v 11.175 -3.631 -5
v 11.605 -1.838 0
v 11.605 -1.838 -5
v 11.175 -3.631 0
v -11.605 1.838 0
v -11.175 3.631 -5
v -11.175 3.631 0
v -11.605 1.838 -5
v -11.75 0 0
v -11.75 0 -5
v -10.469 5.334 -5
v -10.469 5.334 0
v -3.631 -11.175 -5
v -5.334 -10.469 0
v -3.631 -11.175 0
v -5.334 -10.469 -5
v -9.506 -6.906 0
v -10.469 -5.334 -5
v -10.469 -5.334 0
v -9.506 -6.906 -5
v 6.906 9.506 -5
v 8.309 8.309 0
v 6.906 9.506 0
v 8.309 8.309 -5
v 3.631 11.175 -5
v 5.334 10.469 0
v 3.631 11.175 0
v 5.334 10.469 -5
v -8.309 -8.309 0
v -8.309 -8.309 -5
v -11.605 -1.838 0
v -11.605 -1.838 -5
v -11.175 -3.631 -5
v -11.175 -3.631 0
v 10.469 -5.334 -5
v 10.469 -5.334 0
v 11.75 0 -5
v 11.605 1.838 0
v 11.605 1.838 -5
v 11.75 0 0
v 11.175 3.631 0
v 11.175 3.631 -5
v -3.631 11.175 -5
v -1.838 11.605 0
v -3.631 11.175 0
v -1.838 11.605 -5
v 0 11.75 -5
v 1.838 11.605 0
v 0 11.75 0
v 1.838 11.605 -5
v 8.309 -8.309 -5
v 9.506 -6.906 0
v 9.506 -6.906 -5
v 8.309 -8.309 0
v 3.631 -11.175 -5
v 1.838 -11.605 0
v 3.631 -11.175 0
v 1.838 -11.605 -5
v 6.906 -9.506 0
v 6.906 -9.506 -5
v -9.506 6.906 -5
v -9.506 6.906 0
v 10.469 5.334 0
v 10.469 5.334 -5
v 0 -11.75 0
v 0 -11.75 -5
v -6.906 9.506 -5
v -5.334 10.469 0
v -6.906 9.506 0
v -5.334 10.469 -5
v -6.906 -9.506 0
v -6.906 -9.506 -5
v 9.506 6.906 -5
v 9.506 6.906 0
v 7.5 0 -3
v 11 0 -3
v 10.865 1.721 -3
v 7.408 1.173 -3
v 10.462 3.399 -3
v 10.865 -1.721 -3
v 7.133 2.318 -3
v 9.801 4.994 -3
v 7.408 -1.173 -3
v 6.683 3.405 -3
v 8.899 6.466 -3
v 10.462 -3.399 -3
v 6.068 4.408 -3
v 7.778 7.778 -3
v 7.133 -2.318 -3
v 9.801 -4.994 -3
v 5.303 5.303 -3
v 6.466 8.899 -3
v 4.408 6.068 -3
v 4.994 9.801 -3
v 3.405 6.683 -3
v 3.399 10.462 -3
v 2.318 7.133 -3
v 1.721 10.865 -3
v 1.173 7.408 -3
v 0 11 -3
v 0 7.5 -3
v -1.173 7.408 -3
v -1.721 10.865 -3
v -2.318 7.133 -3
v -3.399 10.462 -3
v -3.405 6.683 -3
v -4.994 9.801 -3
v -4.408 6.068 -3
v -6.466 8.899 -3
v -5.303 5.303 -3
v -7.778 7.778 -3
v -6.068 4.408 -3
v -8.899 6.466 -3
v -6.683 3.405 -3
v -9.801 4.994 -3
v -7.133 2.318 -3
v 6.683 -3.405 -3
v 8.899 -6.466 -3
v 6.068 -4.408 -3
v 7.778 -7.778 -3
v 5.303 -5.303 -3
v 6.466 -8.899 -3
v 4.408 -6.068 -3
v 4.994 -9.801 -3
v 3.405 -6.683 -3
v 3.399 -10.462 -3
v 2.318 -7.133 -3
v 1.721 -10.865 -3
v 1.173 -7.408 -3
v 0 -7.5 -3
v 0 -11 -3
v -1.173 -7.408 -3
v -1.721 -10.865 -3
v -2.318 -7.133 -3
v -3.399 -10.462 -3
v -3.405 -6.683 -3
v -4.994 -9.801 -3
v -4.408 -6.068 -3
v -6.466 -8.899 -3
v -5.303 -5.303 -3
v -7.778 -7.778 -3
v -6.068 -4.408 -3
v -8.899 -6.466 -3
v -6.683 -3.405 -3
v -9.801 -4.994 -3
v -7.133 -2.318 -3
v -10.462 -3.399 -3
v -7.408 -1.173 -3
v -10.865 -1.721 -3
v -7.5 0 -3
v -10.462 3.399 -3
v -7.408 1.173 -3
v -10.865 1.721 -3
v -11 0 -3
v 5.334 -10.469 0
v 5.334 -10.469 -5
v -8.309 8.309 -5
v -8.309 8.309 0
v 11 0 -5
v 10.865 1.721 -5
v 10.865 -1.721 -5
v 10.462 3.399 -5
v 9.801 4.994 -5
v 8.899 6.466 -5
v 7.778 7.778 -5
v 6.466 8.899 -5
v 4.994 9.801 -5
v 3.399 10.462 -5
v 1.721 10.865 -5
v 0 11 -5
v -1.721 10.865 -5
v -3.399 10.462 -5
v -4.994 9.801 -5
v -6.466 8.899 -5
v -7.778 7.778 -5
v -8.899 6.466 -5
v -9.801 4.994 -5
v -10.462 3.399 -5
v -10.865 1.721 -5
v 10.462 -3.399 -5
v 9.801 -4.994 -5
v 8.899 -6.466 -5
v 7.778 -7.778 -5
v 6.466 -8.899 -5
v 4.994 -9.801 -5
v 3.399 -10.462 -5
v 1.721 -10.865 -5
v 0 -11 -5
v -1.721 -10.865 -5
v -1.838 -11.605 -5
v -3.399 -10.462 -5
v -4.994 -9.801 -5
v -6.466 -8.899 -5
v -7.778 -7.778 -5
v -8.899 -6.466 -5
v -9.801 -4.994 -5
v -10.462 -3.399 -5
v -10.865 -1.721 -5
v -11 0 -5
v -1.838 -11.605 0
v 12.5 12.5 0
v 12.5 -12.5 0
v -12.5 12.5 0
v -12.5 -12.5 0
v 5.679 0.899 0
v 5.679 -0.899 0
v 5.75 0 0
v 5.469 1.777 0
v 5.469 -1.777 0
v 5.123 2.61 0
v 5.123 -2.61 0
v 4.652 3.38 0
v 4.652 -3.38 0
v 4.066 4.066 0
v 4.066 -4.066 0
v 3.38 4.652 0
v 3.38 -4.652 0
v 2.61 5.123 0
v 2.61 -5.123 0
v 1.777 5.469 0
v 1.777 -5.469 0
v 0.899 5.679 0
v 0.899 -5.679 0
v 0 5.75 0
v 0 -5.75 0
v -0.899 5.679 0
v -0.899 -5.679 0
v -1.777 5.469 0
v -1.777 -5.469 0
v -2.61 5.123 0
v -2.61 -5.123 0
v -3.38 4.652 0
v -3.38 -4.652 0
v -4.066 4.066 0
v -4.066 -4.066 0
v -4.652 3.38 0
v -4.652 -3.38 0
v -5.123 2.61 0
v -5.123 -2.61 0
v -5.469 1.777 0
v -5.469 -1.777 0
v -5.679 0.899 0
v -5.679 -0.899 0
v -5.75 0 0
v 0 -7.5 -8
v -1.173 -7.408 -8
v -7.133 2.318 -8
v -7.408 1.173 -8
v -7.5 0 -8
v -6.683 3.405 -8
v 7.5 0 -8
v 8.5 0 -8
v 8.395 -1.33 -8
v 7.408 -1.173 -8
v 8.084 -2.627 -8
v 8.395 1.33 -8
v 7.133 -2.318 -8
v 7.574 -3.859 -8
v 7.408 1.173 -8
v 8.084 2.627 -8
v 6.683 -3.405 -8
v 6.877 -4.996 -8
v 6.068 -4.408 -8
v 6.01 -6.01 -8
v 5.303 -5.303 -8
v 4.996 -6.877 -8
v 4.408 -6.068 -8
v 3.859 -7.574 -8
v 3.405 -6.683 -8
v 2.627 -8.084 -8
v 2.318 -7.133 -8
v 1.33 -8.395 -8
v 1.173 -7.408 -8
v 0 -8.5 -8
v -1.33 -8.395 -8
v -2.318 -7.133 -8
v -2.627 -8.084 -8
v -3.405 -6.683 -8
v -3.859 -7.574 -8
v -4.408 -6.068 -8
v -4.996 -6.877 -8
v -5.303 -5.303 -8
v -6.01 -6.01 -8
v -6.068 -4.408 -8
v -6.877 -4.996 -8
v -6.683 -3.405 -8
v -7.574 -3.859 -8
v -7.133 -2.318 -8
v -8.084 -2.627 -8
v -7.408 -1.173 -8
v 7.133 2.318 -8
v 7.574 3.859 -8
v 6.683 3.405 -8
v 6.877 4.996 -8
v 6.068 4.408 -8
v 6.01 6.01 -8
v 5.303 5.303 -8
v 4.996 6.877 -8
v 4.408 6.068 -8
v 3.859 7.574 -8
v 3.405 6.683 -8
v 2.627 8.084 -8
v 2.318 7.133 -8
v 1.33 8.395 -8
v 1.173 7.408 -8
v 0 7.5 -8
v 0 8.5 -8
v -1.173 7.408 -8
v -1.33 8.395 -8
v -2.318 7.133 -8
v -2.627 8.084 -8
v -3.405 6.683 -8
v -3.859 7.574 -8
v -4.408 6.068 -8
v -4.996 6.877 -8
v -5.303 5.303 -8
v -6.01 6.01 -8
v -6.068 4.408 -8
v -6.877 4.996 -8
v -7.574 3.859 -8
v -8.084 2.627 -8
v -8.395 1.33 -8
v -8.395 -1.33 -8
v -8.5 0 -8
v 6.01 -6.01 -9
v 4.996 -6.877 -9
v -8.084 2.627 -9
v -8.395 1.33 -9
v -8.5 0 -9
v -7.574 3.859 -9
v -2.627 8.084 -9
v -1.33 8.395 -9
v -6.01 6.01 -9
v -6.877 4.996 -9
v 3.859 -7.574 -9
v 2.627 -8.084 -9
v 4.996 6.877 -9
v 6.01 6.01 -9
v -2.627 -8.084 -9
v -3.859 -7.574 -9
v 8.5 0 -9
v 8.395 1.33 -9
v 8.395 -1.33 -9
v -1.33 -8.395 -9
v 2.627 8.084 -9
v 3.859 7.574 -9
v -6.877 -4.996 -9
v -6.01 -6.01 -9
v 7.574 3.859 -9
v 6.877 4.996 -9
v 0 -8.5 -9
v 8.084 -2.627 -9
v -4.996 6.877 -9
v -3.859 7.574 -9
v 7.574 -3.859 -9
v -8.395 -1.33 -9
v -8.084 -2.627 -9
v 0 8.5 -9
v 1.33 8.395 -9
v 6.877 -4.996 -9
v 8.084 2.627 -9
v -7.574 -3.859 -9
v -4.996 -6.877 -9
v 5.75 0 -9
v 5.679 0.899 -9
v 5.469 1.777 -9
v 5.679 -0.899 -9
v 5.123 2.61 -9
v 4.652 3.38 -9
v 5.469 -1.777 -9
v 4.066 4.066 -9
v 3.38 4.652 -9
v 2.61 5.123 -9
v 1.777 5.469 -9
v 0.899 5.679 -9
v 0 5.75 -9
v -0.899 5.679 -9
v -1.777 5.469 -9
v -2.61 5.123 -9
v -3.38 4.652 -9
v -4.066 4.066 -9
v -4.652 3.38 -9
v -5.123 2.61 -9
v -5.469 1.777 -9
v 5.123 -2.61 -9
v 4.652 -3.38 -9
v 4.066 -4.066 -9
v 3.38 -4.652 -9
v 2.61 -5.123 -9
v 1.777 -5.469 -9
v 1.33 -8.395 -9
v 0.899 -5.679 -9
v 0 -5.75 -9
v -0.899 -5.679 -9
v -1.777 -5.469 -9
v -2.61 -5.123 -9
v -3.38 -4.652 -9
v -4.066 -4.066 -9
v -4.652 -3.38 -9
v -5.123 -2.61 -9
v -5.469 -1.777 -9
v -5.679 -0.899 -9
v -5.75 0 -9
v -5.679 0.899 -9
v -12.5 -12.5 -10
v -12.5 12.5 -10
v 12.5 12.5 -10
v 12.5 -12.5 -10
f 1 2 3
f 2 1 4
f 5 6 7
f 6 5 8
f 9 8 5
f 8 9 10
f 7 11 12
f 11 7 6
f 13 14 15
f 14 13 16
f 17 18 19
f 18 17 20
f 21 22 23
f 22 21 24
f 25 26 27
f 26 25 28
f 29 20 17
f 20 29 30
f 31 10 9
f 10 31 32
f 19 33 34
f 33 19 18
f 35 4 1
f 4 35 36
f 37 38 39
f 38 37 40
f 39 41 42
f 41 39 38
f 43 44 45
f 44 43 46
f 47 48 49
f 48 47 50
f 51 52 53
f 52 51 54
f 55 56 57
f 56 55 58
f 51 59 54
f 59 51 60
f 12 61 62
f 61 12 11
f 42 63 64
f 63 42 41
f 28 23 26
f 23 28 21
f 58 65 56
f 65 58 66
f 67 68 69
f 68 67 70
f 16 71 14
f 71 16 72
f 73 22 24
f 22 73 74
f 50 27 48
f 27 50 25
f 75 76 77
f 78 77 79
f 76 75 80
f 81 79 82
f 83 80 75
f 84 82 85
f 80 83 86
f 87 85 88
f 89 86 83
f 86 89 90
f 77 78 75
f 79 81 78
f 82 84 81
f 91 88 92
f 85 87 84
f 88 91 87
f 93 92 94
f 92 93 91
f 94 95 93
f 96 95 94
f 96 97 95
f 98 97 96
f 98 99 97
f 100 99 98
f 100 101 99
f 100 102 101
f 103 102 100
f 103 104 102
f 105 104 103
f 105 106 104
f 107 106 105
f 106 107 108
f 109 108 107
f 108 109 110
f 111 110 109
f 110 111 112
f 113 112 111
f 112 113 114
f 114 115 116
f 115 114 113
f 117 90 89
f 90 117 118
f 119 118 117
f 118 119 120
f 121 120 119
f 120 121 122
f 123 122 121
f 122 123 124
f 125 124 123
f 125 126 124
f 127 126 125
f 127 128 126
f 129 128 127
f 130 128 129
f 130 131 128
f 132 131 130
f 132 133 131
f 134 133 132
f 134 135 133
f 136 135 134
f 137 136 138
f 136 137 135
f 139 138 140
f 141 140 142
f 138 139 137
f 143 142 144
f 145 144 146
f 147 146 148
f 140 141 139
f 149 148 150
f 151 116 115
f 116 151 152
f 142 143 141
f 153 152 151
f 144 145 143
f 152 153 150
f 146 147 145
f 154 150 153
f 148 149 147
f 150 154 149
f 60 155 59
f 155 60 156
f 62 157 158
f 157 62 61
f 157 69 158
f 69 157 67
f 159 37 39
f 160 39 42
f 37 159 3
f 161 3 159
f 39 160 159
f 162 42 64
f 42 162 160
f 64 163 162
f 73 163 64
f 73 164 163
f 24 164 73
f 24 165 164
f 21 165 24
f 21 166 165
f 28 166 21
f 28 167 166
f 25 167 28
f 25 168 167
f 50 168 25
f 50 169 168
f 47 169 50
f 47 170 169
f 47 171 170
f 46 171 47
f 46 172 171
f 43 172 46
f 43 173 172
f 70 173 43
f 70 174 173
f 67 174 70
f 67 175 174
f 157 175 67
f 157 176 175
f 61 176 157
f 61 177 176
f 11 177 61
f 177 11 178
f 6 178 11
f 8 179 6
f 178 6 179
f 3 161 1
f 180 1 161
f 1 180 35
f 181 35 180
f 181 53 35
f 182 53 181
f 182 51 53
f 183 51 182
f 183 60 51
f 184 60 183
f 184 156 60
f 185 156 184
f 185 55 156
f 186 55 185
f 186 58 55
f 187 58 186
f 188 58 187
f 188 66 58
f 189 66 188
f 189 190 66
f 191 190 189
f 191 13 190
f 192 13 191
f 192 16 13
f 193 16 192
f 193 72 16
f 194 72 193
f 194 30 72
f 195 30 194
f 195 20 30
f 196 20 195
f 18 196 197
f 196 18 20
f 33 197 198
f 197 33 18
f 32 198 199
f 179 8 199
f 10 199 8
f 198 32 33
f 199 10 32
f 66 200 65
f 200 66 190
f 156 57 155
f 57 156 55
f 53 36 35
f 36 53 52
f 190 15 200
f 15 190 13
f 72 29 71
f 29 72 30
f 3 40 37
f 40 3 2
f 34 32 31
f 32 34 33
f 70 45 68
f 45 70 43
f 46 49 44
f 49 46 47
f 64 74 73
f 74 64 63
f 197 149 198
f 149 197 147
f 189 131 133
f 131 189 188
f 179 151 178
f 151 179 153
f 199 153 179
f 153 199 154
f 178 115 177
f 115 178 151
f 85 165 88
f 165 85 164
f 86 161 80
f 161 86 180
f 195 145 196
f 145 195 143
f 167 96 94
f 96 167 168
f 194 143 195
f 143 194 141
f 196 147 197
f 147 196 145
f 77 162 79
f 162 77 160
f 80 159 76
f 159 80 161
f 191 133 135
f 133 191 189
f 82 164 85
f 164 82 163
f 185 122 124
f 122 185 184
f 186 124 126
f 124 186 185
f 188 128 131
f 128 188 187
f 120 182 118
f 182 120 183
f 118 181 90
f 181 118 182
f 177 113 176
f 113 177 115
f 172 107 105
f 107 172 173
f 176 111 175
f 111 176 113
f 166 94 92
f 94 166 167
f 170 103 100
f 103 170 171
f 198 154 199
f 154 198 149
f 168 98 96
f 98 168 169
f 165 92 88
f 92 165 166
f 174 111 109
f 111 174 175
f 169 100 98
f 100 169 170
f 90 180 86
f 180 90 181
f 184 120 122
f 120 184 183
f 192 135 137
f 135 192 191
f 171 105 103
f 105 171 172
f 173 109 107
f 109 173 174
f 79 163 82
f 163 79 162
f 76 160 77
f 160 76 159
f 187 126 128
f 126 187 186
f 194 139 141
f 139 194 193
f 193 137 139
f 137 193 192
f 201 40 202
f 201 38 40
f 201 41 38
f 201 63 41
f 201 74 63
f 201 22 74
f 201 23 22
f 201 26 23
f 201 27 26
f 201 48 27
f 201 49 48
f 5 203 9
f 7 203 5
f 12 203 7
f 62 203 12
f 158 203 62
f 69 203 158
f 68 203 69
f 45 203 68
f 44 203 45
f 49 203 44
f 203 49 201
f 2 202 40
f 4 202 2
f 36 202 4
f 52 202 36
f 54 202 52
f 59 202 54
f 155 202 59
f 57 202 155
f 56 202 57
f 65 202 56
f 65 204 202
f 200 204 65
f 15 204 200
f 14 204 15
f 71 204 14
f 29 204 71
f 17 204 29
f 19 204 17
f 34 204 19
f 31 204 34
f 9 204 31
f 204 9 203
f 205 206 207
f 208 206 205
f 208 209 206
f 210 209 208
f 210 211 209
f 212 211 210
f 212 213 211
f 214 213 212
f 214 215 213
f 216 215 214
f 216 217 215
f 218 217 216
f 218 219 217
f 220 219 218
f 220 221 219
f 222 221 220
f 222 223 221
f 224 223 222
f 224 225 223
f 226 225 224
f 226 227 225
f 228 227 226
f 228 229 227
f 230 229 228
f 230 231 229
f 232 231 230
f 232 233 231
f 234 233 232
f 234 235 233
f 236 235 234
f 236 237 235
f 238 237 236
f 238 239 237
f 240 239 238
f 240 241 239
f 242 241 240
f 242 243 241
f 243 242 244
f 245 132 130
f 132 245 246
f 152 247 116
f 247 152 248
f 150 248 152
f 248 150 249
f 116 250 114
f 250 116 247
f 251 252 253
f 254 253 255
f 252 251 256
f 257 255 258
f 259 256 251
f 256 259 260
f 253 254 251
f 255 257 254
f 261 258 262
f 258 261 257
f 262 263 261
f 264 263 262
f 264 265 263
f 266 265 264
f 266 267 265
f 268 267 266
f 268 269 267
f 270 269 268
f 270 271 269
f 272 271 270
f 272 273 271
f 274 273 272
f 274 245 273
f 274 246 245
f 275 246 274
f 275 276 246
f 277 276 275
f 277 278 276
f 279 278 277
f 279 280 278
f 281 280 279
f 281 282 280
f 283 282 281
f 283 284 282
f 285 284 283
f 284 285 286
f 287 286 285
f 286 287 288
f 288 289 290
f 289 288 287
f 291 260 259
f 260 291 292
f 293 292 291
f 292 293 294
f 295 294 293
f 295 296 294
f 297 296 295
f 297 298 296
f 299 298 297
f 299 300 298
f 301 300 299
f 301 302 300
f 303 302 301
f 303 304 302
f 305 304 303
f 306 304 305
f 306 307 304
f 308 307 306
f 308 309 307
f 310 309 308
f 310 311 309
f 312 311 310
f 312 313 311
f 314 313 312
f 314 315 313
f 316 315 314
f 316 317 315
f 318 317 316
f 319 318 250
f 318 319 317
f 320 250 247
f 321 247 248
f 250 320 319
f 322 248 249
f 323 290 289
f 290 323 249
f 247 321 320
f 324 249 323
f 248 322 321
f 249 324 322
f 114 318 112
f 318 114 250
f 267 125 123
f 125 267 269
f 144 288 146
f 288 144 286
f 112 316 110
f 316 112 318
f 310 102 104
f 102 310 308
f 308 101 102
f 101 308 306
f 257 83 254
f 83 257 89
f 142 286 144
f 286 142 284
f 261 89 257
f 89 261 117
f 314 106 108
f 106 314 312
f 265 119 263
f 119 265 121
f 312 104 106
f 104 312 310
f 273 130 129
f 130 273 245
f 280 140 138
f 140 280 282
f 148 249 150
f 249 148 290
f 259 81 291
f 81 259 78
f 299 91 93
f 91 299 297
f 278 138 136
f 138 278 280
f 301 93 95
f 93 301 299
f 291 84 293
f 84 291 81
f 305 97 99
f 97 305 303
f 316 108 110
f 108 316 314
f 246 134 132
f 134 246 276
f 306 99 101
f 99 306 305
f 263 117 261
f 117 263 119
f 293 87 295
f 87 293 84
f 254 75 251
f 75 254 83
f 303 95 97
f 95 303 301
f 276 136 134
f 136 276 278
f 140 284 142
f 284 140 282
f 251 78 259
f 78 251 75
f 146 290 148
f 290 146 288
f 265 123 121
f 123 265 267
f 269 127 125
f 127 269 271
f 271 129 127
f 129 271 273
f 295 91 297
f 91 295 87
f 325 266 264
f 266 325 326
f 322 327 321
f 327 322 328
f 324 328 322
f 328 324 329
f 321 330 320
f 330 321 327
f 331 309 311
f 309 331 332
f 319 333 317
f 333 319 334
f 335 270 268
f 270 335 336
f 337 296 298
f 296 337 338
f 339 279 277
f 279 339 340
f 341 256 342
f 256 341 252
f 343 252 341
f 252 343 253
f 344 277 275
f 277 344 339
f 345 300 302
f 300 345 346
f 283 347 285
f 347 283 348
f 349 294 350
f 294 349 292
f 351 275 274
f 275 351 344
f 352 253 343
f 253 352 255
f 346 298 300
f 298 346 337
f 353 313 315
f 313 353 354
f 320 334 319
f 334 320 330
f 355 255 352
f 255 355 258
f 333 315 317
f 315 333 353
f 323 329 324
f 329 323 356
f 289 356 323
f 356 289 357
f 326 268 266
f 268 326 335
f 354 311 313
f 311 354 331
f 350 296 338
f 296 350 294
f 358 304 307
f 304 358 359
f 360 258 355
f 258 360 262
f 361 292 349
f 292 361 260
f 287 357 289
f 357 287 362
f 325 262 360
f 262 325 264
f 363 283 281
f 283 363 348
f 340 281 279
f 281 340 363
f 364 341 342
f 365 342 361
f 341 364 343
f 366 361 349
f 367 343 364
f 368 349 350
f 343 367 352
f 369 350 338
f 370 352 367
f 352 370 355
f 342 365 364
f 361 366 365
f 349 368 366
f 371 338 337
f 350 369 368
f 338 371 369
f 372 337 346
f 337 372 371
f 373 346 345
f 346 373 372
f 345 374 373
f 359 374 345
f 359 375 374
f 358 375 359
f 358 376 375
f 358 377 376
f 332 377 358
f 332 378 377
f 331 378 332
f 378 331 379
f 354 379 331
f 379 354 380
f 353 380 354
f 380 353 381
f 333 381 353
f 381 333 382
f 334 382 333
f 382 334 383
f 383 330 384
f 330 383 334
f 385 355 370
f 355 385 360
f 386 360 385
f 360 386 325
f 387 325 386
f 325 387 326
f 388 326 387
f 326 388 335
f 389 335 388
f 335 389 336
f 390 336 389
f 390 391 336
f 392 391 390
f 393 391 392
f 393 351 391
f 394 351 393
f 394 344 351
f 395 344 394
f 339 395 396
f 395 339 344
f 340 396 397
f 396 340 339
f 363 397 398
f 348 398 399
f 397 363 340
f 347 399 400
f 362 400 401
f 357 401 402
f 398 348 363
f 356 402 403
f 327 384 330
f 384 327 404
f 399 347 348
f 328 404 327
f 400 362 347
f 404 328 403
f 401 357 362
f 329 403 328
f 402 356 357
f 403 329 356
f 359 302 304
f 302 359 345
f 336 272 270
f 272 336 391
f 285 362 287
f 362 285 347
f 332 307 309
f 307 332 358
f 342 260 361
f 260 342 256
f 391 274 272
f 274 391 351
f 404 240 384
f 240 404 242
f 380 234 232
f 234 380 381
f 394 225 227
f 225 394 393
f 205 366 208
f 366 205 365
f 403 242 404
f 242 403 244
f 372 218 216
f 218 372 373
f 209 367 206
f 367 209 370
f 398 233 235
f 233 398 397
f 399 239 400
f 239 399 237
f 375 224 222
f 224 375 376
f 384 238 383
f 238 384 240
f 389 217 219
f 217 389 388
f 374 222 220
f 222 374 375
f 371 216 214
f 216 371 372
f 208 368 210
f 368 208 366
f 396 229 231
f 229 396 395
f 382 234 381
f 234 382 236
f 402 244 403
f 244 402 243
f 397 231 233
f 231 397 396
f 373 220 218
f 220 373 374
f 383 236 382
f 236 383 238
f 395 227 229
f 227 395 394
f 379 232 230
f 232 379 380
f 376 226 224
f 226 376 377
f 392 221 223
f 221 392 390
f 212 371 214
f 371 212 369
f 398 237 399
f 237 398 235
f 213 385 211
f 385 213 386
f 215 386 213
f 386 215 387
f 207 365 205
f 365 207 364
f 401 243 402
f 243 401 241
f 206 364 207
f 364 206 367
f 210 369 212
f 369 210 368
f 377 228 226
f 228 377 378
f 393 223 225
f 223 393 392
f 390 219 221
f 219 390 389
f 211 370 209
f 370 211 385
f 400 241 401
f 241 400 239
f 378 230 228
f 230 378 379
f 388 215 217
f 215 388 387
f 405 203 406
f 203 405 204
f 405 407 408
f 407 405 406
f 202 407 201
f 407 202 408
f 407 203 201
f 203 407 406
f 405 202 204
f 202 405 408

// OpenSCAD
outer_dia = 23.5;
inner_dia = 11.5;
lip_dia = 17.0;
lip_outer_dia = 15.0;

wall = 1.5;

height = 3;
wall_height = 2;
tower_height = 5;
lip_height = 1;

//guss form
form_w = 25;
form_l = 25;
form_h = 10;

$fn = 40;

module plug() {
    difference() {
        union() {
            cylinder(d = outer_dia, h = height);
            
            translate([0, 0, height])
            difference() {
                cylinder(d = outer_dia, h = wall_height);
                
                translate([0, 0, -1])
                cylinder(d = outer_dia - wall, h = wall_height + 2);
            }
            
            translate([0, 0, height])
            cylinder(d = lip_outer_dia, h = tower_height);
            
            translate([0, 0, height + tower_height])
            cylinder(d = lip_dia, h = lip_height);
        }
        
        translate([0, 0, -1])
        cylinder(d = inner_dia, h = height + tower_height + lip_height + 2);
    }
}

//plug();

module form() {
    difference() {
        translate([-form_w / 2, -form_l / 2, 0])
        cube([form_w, form_l, form_h]);
        
        plug();
        
        //translate([-0.05, -form_l / 2, -1])
        //    cube([0.1, form_l, form_h + 2]);
    }
}

rotate([0, 180, 0])
form();
